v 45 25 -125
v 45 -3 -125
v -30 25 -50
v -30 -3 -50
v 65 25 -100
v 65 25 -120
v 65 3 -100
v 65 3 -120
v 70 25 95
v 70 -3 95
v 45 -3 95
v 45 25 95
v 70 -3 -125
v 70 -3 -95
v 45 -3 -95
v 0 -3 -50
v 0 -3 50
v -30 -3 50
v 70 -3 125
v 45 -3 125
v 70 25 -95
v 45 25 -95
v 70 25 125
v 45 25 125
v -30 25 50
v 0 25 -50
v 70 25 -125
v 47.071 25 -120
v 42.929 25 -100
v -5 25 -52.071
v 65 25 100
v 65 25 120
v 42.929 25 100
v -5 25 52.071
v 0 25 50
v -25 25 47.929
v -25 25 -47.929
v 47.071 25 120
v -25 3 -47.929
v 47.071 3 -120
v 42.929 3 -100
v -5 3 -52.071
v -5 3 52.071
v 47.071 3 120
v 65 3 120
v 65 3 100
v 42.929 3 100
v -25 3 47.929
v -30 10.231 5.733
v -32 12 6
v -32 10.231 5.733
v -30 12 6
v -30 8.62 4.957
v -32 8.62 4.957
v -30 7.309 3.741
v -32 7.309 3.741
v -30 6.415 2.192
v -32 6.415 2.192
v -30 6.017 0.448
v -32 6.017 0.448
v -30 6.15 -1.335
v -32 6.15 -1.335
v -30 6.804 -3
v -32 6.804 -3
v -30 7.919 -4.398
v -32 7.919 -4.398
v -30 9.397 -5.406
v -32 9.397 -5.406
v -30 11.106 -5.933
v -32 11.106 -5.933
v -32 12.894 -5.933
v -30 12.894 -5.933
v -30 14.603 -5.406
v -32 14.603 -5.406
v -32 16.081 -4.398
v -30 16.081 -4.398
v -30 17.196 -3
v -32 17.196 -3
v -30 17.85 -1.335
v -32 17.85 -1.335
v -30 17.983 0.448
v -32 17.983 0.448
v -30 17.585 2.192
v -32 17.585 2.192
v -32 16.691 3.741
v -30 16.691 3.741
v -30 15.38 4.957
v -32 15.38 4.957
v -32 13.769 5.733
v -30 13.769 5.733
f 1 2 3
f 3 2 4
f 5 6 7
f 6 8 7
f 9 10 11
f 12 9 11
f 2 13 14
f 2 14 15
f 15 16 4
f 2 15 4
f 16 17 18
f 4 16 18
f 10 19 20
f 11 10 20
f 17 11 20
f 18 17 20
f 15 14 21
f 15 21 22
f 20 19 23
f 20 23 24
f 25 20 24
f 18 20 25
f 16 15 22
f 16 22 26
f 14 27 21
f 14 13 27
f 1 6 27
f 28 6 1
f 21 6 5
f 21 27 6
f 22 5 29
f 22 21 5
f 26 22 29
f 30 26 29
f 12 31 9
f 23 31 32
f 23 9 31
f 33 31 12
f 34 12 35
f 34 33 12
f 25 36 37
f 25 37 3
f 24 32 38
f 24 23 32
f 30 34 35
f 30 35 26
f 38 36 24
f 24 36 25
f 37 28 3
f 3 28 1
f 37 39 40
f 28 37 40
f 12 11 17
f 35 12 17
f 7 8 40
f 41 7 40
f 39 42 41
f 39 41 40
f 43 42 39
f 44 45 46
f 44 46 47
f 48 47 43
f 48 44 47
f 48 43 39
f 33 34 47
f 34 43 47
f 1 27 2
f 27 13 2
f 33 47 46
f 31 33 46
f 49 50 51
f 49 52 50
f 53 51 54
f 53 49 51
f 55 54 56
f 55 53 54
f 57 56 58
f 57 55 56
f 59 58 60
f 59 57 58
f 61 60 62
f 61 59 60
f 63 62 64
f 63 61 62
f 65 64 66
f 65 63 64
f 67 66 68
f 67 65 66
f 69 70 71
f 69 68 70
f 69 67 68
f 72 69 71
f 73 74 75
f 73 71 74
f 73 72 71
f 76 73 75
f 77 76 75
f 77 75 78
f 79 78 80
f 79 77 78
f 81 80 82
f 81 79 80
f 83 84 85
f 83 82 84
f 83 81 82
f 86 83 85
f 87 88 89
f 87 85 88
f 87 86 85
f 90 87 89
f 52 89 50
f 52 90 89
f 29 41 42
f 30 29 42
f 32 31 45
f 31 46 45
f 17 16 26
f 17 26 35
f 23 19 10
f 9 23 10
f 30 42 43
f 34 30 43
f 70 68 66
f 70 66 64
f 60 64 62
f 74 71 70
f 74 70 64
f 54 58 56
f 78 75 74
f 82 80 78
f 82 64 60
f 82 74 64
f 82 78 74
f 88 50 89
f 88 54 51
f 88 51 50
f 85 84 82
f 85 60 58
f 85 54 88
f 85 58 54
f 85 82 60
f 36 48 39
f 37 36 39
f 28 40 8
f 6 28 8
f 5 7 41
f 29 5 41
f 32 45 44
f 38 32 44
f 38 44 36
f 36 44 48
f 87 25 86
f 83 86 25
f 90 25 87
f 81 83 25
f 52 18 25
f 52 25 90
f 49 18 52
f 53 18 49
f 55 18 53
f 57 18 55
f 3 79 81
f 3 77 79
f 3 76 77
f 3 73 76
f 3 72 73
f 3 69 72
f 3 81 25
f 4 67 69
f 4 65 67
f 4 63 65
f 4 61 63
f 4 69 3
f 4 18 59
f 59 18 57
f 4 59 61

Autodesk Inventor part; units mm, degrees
ref_plane "YZ Plane" through (0, 0, 0) normal (1, 0, 0) x (0, 1, 0)
ref_plane "XZ Plane" through (0, 0, 0) normal (0, 1, 0) x (-1, 0, 0)
ref_plane "XY Plane" through (0, 0, 0) normal (0, 0, 1) x (1, 0, 0)
sketch "Sketch1" plane through (0, 0, 0) normal (0, 1, 0) x (-1, 0, 0)
  line L0 (-70, 125) -> (-70, 95)
  line L1 (-70, 95) -> (-45, 95)
  line L2 (-45, 95) -> (0, 50)
  line L3 (0, 50) -> (0, 0)
  line L4 (-70, 125) -> (-45, 125)
  line L5 (-45, 125) -> (30, 50)
  line L6 (30, 50) -> (30, 0)
  line L7 (0, 0) -> (-70, 0) construction
  line L8 (-70, -125) -> (-70, -95)
  line L9 (-70, -95) -> (-45, -95)
  line L10 (-45, -95) -> (0, -50)
  line L11 (0, -50) -> (0, 0)
  line L12 (-70, -125) -> (-45, -125)
  line L13 (-45, -125) -> (30, -50)
  line L14 (30, -50) -> (30, 0)
  line L15 (-42.9289, 100) -> (-65, 100)
  line L16 (-65, 100) -> (-65, 120)
  line L17 (-65, 120) -> (-47.0711, 120)
  line L18 (-47.0711, 120) -> (25, 47.9289)
  line L19 (25, 47.9289) -> (25, 0)
  line L20 (25, 0) -> (25, -47.9289)
  line L21 (25, -47.9289) -> (-47.0711, -120)
  line L22 (-47.0711, -120) -> (-65, -120)
  line L23 (-65, -120) -> (-65, -100)
  line L24 (-65, -100) -> (-42.9289, -100)
  line L25 (-42.9289, -100) -> (5, -52.0711)
  line L26 (5, -52.0711) -> (5, 0)
  line L27 (5, 0) -> (5, 52.0711)
  line L28 (5, 52.0711) -> (-42.9289, 100)
  dimension "d0" = 125
  dimension "d1" = 30
  dimension "d4" = 30
  dimension "d5" = 25
  dimension "d6" = 100
  dimension "d7" = 20
extrude "Extrusion3" add sketch "Sketch1" along normal mid plane 6 contours L4 L5 L6 L14 L13 L12 L8 L9 L10 L11 L3 L2 L1 L0 | L15 L16 L17 L18 L19 L20 L21 L22 L23 L24 L25 L26 L27 L28
extrude "Extrusion4" add sketch "Sketch1" along normal blind 25
sketch "Sketch2" plane through (-30, -3, -50) normal (-1, 0, 0) x (0, 0, 1)
  circle A0 centre (50, 15) radius 6
  point P0 (50, 3)
  dimension "d16" = 12
extrude "Extrusion5" add sketch "Sketch2" along normal blind 2
properties part number "prettylny"
